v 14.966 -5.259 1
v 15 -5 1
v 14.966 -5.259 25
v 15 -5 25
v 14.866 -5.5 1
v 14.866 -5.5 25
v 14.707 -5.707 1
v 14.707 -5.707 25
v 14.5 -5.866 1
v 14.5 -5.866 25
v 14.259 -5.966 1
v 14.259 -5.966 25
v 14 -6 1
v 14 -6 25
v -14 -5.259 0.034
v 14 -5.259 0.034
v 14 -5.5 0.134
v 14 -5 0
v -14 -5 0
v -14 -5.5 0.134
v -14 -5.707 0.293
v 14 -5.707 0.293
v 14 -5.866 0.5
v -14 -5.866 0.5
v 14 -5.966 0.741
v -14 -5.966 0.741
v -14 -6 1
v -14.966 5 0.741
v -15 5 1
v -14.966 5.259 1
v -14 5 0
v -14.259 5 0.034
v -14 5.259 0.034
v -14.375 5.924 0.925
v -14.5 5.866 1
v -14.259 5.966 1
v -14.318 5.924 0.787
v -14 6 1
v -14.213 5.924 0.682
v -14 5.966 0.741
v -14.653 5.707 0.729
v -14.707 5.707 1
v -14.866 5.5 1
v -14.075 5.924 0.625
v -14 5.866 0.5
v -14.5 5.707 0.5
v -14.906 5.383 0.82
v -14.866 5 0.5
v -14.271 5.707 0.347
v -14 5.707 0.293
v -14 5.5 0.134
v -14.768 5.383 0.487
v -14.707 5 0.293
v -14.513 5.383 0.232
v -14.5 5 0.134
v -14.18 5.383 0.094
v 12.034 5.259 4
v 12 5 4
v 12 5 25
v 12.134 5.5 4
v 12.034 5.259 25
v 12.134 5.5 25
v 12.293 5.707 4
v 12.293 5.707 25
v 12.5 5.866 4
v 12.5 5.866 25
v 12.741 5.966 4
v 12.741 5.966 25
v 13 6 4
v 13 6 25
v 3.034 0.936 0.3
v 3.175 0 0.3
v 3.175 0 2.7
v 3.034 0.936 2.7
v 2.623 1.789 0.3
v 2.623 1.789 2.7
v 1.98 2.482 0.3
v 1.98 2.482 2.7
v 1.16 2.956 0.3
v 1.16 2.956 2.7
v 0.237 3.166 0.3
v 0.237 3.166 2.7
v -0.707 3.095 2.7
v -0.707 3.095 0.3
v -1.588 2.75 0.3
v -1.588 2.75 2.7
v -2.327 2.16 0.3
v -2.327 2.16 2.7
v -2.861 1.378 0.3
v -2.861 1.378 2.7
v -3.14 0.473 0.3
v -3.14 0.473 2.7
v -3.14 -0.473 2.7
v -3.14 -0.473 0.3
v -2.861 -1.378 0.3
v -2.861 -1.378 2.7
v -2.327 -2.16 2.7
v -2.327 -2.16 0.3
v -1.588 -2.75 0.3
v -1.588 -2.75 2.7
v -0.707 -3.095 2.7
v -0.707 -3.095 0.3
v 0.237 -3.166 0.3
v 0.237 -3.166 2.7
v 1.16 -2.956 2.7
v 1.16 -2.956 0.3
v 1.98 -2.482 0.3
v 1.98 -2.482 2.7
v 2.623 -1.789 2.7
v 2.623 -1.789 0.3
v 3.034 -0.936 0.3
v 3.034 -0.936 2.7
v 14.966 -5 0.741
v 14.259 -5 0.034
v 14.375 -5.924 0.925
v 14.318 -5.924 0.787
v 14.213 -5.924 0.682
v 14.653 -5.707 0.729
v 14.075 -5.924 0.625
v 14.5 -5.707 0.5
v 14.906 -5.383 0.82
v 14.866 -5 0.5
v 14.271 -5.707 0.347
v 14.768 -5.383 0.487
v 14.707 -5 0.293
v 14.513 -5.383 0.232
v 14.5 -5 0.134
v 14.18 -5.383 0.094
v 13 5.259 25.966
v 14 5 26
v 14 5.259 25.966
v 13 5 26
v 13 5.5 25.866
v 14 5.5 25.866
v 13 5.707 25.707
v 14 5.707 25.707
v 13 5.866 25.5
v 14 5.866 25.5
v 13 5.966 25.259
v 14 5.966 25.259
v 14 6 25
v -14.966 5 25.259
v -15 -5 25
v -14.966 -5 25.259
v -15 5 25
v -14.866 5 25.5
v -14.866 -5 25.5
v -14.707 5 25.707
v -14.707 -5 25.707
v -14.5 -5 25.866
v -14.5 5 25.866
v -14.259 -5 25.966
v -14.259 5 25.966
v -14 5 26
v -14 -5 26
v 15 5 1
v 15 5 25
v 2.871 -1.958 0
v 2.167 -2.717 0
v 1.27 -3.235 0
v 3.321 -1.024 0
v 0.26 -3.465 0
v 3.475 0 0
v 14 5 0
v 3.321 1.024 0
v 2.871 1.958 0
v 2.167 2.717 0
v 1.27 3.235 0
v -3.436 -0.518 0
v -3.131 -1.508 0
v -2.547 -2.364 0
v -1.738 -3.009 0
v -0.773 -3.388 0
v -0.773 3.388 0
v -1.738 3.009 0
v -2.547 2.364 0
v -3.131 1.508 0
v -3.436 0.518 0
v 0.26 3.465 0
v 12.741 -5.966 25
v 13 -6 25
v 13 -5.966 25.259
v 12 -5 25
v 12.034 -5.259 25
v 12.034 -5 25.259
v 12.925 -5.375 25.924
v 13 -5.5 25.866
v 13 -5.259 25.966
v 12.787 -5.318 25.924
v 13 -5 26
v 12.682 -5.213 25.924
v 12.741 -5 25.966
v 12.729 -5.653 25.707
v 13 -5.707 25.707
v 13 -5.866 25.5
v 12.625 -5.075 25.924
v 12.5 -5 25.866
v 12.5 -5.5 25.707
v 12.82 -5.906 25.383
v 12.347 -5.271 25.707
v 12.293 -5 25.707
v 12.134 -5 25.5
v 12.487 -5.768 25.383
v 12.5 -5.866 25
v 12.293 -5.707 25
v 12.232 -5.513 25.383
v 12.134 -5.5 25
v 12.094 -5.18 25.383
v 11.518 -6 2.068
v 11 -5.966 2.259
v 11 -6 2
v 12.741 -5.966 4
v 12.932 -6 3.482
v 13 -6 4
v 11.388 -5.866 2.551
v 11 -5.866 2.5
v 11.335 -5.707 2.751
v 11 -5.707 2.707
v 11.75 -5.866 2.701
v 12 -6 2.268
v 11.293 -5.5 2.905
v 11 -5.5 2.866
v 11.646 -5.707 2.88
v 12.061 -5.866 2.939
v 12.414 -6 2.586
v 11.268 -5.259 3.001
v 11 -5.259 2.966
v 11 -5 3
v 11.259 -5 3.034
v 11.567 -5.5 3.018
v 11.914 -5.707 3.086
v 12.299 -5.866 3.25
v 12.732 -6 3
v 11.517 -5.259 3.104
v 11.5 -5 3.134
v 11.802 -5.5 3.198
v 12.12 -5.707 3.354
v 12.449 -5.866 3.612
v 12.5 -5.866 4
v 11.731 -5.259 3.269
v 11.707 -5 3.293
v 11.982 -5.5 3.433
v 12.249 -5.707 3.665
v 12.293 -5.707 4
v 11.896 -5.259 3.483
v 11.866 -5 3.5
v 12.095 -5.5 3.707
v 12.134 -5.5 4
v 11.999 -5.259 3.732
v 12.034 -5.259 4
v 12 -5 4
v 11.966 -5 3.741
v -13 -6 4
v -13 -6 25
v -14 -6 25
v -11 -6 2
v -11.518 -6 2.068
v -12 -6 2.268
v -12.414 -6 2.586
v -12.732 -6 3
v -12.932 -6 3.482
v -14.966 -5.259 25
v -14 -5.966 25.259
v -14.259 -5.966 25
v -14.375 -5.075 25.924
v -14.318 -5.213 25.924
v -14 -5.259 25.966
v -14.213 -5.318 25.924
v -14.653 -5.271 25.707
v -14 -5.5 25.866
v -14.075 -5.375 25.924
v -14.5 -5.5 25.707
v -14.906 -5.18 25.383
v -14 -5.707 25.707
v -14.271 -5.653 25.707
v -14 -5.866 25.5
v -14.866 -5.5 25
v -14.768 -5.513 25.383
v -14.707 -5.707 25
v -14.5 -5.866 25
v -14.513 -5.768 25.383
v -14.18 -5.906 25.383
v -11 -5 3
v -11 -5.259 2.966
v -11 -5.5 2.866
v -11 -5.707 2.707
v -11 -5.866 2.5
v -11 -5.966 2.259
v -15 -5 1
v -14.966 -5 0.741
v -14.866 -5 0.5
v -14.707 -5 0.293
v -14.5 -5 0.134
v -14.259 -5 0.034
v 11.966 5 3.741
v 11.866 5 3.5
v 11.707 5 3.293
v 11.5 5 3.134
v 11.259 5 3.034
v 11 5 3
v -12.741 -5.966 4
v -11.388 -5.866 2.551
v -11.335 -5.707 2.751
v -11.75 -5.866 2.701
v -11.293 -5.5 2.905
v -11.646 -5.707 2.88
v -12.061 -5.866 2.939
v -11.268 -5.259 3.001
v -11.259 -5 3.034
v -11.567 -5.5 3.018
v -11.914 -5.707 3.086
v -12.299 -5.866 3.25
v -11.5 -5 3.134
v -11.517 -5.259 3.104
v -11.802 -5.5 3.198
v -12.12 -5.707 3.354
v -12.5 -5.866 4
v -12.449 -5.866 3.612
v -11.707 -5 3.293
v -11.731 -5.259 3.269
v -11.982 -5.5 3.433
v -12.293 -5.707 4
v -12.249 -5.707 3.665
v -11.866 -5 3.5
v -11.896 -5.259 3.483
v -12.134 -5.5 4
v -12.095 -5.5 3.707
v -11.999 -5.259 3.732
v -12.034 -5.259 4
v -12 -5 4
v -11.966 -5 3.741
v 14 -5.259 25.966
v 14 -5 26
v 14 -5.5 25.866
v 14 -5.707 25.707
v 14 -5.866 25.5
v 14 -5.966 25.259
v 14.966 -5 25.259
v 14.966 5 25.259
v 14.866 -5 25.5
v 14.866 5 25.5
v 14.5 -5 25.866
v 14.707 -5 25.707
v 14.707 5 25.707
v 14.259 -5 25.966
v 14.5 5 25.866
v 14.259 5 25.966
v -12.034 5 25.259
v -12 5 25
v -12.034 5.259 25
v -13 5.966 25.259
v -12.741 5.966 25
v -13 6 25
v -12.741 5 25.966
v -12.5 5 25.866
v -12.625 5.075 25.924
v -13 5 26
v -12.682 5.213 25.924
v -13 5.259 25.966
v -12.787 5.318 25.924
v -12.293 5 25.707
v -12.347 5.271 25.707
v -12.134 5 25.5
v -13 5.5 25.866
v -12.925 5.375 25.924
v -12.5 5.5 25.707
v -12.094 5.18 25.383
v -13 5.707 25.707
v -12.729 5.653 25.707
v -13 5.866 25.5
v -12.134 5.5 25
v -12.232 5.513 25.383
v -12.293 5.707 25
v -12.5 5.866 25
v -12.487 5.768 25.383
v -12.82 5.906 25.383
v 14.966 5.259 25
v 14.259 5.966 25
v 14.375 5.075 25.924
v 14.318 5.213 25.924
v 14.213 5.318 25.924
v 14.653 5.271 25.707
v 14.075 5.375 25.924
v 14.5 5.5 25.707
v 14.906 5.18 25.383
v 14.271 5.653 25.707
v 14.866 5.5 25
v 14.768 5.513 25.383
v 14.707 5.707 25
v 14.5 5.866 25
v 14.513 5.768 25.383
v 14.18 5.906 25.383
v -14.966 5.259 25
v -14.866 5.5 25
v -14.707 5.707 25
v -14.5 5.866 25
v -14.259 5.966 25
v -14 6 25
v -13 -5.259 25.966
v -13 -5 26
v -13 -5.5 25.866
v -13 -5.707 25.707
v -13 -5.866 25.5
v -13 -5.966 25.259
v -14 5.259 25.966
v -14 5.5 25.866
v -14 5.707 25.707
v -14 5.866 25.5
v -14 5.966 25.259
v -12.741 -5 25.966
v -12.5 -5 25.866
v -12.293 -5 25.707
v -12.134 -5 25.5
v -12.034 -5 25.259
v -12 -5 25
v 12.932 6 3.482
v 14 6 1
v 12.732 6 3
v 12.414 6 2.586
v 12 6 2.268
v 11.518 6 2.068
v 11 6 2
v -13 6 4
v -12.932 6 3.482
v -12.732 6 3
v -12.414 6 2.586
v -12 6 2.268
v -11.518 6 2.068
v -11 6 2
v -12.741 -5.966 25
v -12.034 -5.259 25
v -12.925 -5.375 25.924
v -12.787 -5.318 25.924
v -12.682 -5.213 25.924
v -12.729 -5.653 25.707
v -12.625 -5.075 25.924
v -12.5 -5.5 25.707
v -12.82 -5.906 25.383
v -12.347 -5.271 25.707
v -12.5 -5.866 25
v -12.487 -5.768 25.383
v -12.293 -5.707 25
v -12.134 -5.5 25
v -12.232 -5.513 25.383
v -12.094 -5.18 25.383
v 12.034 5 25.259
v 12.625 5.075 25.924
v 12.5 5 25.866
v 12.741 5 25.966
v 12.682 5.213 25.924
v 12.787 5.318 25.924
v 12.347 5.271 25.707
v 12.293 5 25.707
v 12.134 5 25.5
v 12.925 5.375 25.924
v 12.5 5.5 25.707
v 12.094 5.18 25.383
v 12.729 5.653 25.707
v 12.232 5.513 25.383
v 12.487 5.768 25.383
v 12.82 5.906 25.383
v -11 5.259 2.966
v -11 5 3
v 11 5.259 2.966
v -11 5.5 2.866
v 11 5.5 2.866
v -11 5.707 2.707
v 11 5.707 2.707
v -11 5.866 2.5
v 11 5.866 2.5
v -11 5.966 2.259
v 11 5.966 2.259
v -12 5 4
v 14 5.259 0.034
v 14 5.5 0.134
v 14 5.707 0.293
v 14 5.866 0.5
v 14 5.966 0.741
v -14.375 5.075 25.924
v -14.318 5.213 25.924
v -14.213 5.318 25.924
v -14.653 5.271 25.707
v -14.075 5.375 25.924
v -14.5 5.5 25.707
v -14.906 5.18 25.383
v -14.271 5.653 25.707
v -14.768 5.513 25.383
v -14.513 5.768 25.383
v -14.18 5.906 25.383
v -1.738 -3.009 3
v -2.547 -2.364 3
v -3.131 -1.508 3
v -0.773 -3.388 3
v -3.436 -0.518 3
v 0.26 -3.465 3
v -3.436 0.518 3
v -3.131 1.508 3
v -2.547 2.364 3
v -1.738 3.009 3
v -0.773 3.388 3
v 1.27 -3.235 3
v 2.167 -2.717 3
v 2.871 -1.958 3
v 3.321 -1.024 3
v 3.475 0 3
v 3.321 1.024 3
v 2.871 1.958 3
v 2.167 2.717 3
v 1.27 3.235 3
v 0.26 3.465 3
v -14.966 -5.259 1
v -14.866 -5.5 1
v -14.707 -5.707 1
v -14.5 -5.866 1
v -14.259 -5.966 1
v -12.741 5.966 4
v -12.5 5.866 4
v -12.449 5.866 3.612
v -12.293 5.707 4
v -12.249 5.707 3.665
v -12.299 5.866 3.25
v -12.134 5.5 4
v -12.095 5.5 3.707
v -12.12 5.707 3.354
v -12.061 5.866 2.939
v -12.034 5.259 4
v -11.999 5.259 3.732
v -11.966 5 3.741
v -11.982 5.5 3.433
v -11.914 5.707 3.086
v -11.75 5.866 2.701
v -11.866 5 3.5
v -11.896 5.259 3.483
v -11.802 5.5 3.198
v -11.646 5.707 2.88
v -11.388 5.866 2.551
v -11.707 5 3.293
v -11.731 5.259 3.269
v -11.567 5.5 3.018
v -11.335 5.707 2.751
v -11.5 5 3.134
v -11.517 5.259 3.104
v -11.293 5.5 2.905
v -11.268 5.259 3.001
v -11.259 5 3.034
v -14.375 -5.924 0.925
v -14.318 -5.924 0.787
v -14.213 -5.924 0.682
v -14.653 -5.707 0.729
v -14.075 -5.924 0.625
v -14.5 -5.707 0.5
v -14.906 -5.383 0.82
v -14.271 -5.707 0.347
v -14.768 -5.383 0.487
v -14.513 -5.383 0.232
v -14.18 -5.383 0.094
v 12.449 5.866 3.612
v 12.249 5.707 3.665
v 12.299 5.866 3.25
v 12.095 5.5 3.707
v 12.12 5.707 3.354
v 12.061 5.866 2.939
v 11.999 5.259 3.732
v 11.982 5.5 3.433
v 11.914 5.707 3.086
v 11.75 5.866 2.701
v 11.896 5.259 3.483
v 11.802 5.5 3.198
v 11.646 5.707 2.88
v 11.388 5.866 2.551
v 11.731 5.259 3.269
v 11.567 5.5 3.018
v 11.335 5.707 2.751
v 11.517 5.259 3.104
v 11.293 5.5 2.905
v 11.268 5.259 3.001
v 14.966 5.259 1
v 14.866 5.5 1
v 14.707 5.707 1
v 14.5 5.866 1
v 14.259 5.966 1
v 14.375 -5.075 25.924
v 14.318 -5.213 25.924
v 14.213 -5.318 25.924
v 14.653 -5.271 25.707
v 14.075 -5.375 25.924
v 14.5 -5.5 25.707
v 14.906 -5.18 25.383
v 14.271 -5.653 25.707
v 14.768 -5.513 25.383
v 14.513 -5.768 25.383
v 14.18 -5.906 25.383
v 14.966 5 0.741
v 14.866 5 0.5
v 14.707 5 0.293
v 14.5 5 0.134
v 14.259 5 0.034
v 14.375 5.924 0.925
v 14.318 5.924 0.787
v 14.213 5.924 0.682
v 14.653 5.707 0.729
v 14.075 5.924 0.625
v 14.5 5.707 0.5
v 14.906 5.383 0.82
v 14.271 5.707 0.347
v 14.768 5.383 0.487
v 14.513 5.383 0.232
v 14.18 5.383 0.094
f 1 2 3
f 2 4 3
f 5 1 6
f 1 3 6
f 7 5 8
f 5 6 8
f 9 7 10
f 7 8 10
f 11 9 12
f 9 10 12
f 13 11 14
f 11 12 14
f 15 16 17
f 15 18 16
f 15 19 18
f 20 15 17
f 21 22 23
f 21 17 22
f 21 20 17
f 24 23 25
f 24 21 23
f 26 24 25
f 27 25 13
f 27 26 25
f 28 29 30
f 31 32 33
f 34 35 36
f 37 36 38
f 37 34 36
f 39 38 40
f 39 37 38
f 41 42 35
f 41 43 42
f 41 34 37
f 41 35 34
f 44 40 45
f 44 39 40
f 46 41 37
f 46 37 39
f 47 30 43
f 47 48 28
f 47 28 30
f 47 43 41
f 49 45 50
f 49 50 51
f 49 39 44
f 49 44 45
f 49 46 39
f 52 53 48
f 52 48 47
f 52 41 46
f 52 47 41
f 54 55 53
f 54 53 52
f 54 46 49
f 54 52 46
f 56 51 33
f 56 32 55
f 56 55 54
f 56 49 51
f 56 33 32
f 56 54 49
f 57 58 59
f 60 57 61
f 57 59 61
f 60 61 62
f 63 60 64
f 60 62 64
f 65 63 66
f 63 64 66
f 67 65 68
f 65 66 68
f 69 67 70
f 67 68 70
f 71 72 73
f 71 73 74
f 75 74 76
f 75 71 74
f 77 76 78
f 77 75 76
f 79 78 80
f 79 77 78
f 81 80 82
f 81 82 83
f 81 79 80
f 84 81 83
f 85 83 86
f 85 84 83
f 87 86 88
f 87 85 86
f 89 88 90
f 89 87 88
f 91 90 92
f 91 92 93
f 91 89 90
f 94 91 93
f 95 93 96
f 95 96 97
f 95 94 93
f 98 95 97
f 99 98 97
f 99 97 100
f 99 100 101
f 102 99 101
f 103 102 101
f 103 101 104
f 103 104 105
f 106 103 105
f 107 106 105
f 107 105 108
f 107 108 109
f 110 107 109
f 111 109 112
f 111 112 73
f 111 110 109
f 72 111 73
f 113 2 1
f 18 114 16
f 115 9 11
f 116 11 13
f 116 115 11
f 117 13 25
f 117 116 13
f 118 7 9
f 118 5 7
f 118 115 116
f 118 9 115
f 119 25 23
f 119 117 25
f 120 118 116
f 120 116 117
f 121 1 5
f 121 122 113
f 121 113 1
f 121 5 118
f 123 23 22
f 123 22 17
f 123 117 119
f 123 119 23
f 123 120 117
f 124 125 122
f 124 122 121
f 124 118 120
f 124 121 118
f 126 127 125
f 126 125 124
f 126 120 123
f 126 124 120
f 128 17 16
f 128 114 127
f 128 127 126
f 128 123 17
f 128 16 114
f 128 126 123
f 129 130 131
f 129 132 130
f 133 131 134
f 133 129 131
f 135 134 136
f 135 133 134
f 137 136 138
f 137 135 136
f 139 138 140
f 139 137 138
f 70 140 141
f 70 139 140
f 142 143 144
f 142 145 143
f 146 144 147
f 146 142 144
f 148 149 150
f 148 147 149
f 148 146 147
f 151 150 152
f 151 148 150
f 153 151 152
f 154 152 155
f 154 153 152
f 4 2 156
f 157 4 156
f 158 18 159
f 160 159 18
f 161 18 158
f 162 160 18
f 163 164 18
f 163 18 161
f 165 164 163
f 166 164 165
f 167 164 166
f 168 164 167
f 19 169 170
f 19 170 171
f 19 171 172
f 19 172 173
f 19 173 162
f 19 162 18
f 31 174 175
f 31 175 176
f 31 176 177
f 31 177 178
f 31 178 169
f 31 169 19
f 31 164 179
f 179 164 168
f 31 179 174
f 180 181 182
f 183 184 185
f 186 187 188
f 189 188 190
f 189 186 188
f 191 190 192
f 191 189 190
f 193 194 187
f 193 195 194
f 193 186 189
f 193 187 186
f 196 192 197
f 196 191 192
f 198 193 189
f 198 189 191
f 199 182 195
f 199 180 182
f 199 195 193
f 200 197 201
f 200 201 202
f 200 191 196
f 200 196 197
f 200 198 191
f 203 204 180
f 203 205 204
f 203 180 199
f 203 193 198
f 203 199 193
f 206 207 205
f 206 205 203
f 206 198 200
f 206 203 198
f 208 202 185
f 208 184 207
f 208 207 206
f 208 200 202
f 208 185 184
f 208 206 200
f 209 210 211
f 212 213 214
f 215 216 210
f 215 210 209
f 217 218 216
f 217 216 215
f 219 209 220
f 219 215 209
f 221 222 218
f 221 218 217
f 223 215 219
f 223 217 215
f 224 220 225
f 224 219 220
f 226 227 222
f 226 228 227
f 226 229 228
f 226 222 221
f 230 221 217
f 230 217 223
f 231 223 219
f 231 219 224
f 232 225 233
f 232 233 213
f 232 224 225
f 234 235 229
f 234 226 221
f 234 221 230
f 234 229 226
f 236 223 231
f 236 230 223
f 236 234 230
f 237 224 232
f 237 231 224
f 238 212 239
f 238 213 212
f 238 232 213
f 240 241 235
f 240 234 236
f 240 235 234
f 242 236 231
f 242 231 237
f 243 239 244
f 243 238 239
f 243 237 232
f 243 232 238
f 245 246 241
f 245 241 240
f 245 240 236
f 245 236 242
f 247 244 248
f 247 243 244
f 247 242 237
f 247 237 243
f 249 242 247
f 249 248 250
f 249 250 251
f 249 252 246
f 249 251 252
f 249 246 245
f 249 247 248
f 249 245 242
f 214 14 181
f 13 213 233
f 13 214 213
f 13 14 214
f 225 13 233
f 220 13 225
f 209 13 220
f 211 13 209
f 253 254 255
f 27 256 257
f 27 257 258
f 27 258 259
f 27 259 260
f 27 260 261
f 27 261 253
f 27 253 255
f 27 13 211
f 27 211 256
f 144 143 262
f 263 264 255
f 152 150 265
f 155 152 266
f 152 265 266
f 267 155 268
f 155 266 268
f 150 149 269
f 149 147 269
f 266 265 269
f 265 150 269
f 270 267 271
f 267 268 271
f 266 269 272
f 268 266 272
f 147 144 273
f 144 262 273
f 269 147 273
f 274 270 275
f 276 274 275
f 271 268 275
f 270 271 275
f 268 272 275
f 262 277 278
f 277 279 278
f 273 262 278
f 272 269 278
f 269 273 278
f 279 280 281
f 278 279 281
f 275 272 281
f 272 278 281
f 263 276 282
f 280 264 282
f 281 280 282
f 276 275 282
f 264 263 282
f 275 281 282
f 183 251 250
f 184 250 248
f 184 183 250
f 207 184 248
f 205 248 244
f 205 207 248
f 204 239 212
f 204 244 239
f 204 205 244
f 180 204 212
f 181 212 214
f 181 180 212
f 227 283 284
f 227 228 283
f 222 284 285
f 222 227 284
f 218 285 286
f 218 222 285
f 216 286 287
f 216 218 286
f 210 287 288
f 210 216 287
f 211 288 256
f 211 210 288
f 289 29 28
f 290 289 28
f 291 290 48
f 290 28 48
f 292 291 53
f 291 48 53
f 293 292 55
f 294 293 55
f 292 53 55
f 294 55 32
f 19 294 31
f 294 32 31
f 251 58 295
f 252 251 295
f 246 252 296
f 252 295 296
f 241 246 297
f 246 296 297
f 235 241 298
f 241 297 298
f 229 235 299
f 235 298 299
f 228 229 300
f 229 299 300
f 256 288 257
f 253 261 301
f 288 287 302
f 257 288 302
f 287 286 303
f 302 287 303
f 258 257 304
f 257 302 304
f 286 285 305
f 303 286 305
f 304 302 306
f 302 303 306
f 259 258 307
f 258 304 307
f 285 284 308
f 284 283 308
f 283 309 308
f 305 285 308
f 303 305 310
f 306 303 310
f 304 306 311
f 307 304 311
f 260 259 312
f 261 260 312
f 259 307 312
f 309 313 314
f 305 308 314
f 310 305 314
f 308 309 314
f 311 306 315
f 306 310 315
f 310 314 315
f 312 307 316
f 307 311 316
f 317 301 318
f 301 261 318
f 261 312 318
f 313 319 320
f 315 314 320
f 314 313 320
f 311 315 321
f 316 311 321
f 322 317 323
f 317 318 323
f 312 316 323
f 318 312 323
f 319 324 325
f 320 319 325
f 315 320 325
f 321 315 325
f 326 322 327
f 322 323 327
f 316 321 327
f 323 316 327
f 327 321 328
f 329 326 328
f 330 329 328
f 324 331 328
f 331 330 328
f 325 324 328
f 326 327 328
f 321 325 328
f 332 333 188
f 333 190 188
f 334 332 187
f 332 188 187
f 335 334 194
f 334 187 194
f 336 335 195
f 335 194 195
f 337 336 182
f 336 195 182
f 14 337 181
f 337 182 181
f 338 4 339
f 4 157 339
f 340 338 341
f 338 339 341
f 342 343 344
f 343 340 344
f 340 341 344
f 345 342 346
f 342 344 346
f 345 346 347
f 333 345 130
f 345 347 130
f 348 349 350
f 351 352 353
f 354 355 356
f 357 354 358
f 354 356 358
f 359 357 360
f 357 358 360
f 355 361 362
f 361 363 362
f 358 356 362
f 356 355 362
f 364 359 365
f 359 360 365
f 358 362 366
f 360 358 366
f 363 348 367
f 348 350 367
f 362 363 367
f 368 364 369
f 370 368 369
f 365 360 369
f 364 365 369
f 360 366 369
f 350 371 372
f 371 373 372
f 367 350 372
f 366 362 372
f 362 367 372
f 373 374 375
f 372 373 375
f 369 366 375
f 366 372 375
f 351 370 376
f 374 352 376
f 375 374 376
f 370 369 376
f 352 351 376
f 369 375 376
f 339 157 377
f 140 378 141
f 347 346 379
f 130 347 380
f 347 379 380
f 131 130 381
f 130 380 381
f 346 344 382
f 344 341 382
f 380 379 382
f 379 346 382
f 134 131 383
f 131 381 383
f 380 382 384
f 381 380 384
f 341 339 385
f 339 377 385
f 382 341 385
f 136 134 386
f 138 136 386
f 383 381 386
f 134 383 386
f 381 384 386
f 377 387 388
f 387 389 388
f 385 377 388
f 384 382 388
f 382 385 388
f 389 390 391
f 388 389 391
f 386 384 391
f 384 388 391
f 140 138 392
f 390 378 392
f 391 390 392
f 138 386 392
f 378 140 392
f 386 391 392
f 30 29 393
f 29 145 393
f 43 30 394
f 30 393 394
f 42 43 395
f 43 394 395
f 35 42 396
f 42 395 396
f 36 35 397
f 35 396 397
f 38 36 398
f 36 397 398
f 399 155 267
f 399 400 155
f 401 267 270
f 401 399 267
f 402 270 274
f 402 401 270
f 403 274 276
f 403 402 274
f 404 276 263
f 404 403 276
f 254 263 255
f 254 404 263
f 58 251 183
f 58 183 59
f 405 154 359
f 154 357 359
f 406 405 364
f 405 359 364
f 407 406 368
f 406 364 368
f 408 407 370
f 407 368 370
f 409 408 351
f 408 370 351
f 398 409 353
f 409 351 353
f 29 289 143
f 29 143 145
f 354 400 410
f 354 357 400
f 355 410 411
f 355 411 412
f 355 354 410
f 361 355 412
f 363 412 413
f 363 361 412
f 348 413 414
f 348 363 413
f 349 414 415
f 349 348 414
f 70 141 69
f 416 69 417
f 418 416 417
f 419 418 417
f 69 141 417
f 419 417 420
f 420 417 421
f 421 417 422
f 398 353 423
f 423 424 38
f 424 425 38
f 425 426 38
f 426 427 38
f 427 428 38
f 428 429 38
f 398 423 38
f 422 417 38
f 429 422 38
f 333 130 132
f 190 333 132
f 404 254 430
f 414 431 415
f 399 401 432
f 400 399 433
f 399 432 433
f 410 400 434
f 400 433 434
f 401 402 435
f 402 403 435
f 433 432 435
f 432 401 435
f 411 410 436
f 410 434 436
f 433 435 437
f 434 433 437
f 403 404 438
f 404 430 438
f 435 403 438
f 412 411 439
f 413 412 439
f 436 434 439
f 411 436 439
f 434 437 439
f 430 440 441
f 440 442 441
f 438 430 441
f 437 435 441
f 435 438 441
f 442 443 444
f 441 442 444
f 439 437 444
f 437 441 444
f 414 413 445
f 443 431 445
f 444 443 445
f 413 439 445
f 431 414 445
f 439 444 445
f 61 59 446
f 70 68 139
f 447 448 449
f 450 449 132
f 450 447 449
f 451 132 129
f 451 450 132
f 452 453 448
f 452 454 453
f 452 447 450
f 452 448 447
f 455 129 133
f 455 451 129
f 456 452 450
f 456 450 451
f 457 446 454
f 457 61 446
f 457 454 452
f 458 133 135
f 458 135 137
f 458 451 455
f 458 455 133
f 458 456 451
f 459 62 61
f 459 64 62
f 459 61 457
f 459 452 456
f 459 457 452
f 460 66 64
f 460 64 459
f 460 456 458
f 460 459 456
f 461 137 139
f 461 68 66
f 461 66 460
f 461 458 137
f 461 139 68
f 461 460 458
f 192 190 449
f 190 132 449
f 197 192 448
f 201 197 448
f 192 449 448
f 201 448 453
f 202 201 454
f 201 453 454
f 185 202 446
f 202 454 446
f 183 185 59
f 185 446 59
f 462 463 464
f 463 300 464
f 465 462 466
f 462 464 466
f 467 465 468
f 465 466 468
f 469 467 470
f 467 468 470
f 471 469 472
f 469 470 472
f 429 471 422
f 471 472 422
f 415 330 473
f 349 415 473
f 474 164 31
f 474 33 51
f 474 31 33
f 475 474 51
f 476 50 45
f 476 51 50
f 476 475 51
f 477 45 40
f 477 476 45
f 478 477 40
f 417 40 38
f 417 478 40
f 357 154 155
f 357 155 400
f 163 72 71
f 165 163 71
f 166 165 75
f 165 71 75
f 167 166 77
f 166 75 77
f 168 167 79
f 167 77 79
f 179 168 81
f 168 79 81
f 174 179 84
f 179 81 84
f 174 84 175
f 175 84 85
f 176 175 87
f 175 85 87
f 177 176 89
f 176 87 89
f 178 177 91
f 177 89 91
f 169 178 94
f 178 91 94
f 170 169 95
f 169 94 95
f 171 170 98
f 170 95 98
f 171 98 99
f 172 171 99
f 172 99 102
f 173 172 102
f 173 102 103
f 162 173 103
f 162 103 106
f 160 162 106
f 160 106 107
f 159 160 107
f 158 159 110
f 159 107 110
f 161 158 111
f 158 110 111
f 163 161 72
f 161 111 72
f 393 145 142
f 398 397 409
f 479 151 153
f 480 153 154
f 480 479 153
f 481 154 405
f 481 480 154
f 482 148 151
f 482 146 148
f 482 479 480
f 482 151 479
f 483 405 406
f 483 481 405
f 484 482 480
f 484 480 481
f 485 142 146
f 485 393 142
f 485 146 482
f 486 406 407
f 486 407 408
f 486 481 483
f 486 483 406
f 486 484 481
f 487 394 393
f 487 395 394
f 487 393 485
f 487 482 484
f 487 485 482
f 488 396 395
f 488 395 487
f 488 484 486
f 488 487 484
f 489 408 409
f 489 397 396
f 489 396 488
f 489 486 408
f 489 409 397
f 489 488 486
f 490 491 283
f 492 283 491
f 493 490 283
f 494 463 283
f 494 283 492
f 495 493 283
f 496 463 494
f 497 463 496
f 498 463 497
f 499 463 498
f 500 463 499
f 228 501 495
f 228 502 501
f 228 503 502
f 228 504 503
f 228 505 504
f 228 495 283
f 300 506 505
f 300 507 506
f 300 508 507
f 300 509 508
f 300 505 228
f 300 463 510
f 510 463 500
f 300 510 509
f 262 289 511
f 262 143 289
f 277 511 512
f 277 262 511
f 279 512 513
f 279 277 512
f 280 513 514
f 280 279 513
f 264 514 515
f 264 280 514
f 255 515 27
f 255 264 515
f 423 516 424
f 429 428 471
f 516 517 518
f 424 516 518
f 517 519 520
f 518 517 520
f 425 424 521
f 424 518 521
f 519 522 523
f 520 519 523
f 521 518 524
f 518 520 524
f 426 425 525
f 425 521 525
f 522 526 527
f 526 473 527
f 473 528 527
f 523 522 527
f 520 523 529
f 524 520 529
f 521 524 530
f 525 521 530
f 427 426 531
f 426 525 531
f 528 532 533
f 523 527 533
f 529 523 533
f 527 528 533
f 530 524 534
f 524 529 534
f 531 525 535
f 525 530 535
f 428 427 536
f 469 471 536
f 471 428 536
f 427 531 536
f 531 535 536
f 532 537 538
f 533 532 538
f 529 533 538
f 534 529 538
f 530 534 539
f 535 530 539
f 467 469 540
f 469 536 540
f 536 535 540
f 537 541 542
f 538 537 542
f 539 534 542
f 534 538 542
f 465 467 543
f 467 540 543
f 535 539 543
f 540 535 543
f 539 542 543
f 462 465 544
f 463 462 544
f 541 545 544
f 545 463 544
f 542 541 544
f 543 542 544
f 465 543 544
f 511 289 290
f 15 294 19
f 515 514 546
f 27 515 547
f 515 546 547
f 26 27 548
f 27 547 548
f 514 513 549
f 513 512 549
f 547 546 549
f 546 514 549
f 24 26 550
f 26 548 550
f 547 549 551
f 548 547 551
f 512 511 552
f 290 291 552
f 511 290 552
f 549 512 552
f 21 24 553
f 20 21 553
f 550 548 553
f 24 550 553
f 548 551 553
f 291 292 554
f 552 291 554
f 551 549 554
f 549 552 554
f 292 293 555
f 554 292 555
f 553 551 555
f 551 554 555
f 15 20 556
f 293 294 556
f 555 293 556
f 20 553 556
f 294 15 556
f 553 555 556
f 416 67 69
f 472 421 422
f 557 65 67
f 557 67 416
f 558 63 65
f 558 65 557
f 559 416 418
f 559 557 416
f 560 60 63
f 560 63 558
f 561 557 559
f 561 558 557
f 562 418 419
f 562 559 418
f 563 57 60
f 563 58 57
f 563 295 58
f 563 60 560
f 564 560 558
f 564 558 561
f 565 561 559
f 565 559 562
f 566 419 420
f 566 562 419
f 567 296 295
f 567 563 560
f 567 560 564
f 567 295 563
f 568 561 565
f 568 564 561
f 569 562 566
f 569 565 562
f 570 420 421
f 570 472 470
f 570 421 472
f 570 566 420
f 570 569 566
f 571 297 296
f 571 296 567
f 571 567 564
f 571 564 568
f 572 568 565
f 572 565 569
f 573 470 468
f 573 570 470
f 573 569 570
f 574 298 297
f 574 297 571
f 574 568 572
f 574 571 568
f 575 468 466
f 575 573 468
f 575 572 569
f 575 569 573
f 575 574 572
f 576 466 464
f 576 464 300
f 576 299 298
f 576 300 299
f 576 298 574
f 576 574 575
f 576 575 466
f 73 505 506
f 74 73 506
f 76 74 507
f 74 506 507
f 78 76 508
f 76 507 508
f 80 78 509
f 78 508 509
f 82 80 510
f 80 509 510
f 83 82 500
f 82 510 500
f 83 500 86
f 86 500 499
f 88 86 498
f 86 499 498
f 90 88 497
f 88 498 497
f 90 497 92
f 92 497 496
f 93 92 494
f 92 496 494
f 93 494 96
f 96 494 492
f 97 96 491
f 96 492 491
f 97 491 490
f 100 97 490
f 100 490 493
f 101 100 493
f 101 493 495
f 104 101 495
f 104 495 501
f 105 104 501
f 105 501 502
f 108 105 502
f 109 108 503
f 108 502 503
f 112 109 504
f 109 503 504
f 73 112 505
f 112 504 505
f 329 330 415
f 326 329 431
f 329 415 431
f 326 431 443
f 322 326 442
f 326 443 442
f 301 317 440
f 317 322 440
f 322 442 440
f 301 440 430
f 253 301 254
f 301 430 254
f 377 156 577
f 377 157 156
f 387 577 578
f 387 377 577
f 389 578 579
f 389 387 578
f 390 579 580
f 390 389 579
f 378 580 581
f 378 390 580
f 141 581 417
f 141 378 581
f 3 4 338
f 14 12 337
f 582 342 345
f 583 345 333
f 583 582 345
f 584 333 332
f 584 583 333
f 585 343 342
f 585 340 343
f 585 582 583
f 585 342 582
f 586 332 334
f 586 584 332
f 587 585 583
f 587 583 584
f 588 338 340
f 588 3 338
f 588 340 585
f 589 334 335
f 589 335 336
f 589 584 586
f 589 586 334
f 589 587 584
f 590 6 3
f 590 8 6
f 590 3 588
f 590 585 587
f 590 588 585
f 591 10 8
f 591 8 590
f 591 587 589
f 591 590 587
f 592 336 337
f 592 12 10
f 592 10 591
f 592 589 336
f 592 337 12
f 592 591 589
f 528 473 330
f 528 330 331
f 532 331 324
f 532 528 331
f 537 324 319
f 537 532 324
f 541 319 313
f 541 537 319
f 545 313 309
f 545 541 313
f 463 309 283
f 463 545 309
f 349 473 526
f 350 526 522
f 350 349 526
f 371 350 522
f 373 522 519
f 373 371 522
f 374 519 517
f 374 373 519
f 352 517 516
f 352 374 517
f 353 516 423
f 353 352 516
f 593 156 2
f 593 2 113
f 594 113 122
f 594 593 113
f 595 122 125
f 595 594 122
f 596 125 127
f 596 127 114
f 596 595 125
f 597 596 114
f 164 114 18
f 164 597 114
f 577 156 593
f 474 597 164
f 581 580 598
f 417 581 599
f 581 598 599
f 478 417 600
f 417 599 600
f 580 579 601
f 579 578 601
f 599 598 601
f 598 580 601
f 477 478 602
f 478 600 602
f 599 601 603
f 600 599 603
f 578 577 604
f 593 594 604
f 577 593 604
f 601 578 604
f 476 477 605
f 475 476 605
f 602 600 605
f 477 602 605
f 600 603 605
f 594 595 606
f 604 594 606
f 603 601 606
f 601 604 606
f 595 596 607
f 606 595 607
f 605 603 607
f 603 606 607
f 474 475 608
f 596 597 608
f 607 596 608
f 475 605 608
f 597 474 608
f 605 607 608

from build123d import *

# Parameters (mm, degrees)
SKETCH1_W           = 24
SKETCH1_H           = 12
SKETCH1_R           = 3.175
BOSS_EXTRUDE1_DEPTH = 3
SKETCH3_W           = 3
SKETCH3_H           = 12
BOSS_EXTRUDE2_DEPTH = 26
FILLET1_R           = 1
CHAMFER1_SIZE       = 0.3


# Read off the part's stored shape, not the designer's step: Mirror1
with BuildPart() as part:
    # Sketch1 → Boss-Extrude1 (new body)
    with BuildSketch(Plane.XY):
        Rectangle(SKETCH1_W, SKETCH1_H)
        Circle(SKETCH1_R, mode=Mode.SUBTRACT)
    extrude(amount=BOSS_EXTRUDE1_DEPTH)

    # Sketch3 → Boss-Extrude2 (add)
    with BuildSketch(Plane.XY):
        with Locations((-13.5, 0)):
            Rectangle(SKETCH3_W, SKETCH3_H)
    extrude(amount=BOSS_EXTRUDE2_DEPTH)

    # Fillet1
    fillet1_edges = [part.edges().sort_by_distance(p)[0] for p in [
        (-12, 0, 3),
        (0, -6, 3),
        (-15, 0, 0),
        (-15, 6, 13),
        (-15, -6, 13),
        (-12, -6, 14.5),
        (-12, 6, 14.5),
        (-15, 0, 26),
        (-13.5, -6, 26),
        (-12, 0, 26),
        (-13.5, 6, 26),
        (-1.5, -6, 0),
        (-1.5, 6, 0),
        (0, 6, 3),
    ]]
    fillet(fillet1_edges, radius=FILLET1_R)

    # Mirror1: part across plane


with BuildPart() as part_1:
    add(part.part)
    add(part.part.mirror(Plane(origin=(0, 0, 0), x_dir=(0, 0, 1), z_dir=(1, 0, 0))))

    # Chamfer1
    chamfer1_edges = [part_1.edges().sort_by_distance(p)[0] for p in [
        (-3.175, 0, 0),
        (-3.175, 0, 3),
    ]]
    chamfer(chamfer1_edges, length=CHAMFER1_SIZE)


solid = part_1.part
